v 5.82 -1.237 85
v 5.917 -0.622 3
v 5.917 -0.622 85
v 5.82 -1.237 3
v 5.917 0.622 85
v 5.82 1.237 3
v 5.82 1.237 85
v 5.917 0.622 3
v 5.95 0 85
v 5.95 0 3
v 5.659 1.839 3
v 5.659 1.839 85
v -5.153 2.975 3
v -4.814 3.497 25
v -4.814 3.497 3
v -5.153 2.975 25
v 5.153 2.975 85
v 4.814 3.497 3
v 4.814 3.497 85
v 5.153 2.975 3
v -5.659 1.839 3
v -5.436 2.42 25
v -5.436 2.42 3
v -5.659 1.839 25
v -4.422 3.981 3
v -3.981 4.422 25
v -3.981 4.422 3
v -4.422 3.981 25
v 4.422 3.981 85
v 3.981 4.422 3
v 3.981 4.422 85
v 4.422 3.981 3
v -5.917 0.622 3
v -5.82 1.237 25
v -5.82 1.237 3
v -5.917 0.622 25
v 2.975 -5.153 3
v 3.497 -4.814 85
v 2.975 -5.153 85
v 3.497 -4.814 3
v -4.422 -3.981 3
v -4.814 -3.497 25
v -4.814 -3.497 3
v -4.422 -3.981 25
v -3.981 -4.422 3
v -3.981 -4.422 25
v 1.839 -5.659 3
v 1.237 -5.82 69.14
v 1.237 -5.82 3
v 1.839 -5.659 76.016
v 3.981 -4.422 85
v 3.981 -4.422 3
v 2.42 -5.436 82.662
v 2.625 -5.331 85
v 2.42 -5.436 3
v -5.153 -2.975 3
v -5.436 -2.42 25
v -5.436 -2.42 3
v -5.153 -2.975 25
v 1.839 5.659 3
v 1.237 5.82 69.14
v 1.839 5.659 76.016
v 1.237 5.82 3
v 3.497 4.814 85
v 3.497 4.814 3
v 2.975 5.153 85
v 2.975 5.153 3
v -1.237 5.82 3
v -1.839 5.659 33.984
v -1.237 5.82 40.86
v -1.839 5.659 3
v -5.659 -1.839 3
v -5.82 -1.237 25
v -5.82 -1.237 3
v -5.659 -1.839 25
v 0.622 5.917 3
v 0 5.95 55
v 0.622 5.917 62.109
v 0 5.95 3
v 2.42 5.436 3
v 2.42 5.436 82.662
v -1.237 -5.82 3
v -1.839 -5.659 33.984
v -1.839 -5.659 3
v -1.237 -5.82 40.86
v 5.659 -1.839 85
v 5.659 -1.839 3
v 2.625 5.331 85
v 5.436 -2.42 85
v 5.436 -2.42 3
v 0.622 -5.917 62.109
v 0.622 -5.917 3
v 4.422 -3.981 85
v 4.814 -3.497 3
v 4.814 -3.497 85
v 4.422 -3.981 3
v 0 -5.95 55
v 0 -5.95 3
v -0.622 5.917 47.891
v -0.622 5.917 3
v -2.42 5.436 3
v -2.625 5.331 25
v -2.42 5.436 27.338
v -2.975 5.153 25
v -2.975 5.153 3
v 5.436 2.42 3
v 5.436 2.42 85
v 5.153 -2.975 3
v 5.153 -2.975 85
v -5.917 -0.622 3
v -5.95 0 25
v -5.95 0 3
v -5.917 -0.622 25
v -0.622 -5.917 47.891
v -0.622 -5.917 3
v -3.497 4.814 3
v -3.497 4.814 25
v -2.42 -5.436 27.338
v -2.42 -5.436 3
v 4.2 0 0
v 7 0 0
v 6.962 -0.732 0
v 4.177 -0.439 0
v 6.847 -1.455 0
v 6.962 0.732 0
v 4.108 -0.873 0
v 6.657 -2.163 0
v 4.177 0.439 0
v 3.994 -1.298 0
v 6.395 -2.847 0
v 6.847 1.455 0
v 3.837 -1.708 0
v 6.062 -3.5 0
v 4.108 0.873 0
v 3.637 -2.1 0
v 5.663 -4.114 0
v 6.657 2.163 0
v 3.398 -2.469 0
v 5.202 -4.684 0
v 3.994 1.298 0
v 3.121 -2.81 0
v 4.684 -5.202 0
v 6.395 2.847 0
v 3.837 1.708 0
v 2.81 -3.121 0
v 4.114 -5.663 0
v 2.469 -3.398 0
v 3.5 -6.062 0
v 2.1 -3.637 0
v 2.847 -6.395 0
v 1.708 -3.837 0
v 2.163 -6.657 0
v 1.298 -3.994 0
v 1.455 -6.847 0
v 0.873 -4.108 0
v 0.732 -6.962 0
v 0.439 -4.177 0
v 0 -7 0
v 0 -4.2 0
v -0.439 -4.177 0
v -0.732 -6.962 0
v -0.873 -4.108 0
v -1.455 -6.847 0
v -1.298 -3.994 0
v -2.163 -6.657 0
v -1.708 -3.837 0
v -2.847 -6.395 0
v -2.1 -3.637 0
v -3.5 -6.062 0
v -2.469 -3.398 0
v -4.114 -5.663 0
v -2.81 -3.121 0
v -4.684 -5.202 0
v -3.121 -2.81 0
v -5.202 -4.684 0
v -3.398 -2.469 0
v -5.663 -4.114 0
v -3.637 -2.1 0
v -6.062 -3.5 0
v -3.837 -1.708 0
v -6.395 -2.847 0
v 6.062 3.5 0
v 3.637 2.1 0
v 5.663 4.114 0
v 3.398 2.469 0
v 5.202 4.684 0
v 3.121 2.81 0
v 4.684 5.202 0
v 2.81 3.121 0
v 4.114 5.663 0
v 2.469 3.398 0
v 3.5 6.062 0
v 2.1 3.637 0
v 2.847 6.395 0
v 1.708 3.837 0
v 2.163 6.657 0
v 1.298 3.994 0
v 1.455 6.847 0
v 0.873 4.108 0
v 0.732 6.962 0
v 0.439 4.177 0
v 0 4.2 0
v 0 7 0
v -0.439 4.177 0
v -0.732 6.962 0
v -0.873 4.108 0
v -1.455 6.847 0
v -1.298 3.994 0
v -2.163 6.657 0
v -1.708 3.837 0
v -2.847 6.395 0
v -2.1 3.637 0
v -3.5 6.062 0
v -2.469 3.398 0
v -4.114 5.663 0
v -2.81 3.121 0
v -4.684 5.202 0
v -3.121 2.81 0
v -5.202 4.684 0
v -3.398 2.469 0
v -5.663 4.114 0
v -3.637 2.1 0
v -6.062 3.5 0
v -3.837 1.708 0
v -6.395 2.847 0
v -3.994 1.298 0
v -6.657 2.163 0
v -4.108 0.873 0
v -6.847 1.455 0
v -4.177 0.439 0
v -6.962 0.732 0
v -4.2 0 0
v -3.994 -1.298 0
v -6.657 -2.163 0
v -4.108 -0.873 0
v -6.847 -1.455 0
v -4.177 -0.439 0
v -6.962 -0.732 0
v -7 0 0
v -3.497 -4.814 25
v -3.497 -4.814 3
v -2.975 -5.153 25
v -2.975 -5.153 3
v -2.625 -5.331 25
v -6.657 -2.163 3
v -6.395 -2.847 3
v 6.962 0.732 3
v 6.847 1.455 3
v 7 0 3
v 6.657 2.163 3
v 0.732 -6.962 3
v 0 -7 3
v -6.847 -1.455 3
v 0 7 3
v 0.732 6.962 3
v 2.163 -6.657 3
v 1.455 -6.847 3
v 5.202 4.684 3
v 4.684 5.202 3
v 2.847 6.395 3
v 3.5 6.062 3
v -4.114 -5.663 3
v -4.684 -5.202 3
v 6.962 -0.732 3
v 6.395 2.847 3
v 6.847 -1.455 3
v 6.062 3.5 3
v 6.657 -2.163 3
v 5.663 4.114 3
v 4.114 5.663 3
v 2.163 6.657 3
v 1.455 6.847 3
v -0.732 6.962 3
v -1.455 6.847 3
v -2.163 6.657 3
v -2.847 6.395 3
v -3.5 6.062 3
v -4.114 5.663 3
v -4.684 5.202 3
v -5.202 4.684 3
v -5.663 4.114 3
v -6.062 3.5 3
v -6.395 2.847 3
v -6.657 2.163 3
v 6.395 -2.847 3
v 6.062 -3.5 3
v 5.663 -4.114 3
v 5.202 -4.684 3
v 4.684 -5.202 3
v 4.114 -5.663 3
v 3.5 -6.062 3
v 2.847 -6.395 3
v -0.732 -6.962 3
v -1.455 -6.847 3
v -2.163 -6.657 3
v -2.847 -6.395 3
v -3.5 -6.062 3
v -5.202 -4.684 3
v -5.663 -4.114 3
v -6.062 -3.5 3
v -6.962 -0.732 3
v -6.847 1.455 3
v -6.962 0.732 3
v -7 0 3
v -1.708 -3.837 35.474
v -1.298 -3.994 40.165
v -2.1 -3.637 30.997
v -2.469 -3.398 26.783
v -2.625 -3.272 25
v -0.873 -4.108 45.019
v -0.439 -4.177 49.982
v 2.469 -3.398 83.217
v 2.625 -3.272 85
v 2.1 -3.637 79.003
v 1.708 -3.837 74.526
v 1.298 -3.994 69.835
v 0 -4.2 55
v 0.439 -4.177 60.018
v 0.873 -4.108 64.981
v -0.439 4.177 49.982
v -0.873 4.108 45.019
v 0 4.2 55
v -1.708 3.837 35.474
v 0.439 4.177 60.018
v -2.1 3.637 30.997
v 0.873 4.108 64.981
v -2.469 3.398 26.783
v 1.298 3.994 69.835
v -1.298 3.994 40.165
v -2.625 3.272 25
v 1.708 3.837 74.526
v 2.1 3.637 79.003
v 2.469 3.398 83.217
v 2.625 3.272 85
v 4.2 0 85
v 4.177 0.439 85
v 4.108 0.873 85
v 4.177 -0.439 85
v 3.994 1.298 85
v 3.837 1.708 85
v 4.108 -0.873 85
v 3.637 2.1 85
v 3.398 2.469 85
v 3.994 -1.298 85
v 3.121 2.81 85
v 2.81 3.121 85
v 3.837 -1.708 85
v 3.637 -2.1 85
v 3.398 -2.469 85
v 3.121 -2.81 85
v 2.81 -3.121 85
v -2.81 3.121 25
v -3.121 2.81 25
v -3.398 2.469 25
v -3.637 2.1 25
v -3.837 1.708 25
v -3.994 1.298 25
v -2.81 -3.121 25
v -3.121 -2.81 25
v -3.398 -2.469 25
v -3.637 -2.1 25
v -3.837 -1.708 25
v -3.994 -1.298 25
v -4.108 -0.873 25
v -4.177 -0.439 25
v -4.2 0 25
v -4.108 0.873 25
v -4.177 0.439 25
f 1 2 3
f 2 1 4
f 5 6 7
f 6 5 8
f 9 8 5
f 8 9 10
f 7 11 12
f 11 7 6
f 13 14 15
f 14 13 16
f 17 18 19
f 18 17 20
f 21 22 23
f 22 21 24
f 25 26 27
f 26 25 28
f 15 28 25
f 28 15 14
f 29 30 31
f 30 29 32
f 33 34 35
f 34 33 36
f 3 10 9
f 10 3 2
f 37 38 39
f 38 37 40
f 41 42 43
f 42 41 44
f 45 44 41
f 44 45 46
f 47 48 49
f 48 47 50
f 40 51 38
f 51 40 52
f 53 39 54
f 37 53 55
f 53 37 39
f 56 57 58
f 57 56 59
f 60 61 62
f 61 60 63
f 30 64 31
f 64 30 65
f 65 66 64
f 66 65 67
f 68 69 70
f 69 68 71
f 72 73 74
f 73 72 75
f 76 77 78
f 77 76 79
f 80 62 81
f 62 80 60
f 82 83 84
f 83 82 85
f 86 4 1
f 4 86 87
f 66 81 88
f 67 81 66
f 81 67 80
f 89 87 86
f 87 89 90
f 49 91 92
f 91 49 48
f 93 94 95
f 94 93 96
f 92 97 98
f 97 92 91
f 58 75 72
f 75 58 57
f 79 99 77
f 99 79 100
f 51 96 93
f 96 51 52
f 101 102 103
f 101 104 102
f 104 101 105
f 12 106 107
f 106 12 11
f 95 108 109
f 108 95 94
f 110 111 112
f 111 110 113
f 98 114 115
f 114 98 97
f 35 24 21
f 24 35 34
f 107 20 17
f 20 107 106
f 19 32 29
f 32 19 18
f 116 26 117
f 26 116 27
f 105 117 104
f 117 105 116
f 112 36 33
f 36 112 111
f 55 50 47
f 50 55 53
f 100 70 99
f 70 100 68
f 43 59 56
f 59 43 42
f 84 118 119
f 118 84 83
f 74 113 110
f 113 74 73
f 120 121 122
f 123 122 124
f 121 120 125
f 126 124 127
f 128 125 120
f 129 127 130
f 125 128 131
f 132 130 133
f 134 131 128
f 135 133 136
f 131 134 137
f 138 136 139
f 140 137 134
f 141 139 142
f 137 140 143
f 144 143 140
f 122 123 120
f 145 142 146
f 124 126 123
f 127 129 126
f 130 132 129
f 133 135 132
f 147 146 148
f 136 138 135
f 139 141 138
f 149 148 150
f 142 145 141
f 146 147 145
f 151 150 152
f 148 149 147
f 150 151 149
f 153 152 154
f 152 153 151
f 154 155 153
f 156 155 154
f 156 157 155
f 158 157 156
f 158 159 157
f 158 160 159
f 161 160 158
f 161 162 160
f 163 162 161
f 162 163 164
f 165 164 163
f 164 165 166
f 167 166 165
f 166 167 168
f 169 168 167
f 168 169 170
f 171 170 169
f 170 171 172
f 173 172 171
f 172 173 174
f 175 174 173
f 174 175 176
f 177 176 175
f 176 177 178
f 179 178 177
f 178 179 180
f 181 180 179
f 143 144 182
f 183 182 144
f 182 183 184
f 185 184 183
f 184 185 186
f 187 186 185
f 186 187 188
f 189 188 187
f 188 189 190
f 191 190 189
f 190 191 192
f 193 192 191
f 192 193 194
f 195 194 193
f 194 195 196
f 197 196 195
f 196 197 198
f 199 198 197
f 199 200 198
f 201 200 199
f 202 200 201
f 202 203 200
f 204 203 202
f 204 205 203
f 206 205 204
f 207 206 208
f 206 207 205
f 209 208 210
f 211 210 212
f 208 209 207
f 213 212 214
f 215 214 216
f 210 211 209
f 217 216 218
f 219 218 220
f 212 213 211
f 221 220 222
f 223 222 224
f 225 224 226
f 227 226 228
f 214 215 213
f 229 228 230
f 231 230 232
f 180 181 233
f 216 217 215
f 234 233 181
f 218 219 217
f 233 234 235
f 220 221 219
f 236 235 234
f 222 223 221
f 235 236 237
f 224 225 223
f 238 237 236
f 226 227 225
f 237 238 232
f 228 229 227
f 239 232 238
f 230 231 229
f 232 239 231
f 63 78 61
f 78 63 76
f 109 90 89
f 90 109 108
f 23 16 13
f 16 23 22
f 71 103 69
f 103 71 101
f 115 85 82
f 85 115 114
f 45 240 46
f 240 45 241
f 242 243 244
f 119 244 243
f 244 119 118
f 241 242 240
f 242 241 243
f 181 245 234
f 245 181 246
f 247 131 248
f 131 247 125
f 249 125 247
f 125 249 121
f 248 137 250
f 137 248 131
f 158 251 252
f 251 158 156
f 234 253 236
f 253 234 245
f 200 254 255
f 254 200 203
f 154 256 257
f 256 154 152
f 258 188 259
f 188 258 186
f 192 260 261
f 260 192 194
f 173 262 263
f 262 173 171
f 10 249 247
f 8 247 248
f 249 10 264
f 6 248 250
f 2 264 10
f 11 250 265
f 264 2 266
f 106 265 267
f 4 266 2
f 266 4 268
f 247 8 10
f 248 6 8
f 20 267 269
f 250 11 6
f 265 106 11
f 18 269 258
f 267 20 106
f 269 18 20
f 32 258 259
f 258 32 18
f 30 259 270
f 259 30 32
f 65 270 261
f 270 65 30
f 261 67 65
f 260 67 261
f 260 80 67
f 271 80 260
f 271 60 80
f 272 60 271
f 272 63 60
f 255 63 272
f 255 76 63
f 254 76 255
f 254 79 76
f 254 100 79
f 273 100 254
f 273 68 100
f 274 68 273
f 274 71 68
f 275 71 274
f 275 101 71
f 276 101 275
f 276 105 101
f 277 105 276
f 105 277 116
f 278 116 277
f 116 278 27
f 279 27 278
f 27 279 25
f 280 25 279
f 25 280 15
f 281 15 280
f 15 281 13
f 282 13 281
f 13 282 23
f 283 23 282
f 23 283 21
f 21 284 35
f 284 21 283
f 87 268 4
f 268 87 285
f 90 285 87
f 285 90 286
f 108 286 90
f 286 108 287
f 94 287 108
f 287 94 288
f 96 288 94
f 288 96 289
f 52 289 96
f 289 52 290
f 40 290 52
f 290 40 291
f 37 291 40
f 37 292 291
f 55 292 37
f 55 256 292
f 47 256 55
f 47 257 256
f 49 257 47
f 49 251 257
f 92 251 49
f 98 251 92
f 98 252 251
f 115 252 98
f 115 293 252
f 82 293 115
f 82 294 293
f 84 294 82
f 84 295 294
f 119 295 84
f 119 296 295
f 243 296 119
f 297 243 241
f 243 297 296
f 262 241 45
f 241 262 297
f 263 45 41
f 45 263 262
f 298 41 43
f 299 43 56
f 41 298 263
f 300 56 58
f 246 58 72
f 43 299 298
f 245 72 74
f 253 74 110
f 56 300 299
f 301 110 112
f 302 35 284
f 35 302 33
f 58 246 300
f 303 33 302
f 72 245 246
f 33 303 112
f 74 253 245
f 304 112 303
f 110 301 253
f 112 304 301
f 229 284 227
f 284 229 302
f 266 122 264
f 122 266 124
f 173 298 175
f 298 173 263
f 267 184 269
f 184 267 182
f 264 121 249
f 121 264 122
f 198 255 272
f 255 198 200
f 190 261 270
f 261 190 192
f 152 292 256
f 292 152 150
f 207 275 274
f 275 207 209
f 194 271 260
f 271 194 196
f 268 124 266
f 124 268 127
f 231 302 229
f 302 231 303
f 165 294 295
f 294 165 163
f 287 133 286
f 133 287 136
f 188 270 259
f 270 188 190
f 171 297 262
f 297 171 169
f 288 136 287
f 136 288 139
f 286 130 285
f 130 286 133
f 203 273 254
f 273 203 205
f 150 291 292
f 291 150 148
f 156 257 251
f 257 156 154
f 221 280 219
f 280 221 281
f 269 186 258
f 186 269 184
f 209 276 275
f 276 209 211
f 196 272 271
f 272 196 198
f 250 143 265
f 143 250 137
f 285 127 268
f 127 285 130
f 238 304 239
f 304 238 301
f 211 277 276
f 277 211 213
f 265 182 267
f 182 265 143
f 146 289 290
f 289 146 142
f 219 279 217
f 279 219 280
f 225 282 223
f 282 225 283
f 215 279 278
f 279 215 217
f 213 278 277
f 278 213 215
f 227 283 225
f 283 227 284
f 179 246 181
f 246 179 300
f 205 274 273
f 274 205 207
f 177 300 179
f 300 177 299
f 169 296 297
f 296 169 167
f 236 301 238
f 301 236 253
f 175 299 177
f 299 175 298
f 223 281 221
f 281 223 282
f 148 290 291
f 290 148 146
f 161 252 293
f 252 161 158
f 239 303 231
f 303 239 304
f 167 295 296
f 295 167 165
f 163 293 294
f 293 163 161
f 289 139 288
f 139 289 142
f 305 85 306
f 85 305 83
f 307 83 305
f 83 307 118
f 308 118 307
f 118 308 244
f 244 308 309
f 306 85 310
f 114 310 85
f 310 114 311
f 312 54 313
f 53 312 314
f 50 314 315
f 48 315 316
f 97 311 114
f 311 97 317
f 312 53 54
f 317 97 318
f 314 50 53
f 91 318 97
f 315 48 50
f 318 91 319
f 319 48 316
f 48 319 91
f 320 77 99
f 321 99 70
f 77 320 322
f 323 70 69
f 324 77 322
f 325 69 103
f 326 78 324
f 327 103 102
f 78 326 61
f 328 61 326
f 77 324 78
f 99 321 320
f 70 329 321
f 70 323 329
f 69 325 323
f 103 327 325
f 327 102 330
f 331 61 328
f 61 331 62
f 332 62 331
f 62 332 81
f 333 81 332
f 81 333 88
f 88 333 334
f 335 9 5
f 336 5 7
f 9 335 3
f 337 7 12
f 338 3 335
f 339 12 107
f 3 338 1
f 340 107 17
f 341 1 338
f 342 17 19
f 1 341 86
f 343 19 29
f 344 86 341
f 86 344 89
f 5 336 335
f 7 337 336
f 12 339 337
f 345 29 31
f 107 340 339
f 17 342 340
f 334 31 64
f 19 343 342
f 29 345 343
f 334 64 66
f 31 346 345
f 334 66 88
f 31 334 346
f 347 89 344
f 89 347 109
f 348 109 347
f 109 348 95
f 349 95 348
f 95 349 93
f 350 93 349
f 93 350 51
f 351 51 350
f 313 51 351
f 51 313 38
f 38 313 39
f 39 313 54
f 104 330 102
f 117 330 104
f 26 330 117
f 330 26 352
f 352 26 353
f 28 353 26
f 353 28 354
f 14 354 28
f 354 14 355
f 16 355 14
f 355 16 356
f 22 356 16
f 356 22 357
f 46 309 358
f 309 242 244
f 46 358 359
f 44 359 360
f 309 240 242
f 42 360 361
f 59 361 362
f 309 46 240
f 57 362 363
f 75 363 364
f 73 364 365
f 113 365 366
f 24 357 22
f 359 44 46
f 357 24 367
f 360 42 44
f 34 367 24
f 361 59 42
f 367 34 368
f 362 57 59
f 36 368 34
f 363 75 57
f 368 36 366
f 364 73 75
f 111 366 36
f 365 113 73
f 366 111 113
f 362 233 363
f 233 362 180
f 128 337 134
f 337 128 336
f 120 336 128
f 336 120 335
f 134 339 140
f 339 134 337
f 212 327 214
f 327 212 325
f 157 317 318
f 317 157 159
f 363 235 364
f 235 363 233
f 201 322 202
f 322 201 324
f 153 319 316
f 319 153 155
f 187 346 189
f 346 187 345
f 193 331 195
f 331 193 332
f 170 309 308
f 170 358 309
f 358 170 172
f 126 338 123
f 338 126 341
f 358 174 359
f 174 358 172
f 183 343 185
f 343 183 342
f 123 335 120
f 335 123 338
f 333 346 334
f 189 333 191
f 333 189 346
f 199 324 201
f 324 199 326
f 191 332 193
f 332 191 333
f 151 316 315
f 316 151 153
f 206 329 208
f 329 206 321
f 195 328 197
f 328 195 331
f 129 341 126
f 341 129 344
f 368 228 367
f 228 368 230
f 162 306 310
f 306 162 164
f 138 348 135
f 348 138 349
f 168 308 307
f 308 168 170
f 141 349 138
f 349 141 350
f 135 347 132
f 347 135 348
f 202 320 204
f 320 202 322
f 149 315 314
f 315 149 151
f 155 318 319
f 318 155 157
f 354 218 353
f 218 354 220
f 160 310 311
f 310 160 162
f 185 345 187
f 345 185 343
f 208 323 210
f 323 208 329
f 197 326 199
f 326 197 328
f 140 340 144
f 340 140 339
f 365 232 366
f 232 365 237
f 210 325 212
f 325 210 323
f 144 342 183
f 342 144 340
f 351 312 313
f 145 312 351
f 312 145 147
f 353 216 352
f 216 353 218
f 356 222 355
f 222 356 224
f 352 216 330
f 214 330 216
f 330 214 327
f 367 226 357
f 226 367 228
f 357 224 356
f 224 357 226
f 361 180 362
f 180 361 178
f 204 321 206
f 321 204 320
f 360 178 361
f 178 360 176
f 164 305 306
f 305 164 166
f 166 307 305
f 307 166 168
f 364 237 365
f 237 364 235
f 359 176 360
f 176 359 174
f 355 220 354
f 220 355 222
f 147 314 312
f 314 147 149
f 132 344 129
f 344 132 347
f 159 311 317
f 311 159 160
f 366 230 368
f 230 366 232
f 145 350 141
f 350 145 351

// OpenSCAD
difference(){ union(){cylinder(r=5.95,h=100,$fn=60);
cylinder(r=7,h=3,$fn=60);}
cylinder(r=4.2,h=200,center=true,$fn=60);
translate([ 0,0,55])rotate(a=180,v=[0,1,0])
difference(){
union(){
rotate(a=5,v=[0,1,0])translate([0,-100,-100])cube(200);
translate([-100,-100,-200-30])cube(200);
}
translate([-100,-100,30])cube(200);
}
}
